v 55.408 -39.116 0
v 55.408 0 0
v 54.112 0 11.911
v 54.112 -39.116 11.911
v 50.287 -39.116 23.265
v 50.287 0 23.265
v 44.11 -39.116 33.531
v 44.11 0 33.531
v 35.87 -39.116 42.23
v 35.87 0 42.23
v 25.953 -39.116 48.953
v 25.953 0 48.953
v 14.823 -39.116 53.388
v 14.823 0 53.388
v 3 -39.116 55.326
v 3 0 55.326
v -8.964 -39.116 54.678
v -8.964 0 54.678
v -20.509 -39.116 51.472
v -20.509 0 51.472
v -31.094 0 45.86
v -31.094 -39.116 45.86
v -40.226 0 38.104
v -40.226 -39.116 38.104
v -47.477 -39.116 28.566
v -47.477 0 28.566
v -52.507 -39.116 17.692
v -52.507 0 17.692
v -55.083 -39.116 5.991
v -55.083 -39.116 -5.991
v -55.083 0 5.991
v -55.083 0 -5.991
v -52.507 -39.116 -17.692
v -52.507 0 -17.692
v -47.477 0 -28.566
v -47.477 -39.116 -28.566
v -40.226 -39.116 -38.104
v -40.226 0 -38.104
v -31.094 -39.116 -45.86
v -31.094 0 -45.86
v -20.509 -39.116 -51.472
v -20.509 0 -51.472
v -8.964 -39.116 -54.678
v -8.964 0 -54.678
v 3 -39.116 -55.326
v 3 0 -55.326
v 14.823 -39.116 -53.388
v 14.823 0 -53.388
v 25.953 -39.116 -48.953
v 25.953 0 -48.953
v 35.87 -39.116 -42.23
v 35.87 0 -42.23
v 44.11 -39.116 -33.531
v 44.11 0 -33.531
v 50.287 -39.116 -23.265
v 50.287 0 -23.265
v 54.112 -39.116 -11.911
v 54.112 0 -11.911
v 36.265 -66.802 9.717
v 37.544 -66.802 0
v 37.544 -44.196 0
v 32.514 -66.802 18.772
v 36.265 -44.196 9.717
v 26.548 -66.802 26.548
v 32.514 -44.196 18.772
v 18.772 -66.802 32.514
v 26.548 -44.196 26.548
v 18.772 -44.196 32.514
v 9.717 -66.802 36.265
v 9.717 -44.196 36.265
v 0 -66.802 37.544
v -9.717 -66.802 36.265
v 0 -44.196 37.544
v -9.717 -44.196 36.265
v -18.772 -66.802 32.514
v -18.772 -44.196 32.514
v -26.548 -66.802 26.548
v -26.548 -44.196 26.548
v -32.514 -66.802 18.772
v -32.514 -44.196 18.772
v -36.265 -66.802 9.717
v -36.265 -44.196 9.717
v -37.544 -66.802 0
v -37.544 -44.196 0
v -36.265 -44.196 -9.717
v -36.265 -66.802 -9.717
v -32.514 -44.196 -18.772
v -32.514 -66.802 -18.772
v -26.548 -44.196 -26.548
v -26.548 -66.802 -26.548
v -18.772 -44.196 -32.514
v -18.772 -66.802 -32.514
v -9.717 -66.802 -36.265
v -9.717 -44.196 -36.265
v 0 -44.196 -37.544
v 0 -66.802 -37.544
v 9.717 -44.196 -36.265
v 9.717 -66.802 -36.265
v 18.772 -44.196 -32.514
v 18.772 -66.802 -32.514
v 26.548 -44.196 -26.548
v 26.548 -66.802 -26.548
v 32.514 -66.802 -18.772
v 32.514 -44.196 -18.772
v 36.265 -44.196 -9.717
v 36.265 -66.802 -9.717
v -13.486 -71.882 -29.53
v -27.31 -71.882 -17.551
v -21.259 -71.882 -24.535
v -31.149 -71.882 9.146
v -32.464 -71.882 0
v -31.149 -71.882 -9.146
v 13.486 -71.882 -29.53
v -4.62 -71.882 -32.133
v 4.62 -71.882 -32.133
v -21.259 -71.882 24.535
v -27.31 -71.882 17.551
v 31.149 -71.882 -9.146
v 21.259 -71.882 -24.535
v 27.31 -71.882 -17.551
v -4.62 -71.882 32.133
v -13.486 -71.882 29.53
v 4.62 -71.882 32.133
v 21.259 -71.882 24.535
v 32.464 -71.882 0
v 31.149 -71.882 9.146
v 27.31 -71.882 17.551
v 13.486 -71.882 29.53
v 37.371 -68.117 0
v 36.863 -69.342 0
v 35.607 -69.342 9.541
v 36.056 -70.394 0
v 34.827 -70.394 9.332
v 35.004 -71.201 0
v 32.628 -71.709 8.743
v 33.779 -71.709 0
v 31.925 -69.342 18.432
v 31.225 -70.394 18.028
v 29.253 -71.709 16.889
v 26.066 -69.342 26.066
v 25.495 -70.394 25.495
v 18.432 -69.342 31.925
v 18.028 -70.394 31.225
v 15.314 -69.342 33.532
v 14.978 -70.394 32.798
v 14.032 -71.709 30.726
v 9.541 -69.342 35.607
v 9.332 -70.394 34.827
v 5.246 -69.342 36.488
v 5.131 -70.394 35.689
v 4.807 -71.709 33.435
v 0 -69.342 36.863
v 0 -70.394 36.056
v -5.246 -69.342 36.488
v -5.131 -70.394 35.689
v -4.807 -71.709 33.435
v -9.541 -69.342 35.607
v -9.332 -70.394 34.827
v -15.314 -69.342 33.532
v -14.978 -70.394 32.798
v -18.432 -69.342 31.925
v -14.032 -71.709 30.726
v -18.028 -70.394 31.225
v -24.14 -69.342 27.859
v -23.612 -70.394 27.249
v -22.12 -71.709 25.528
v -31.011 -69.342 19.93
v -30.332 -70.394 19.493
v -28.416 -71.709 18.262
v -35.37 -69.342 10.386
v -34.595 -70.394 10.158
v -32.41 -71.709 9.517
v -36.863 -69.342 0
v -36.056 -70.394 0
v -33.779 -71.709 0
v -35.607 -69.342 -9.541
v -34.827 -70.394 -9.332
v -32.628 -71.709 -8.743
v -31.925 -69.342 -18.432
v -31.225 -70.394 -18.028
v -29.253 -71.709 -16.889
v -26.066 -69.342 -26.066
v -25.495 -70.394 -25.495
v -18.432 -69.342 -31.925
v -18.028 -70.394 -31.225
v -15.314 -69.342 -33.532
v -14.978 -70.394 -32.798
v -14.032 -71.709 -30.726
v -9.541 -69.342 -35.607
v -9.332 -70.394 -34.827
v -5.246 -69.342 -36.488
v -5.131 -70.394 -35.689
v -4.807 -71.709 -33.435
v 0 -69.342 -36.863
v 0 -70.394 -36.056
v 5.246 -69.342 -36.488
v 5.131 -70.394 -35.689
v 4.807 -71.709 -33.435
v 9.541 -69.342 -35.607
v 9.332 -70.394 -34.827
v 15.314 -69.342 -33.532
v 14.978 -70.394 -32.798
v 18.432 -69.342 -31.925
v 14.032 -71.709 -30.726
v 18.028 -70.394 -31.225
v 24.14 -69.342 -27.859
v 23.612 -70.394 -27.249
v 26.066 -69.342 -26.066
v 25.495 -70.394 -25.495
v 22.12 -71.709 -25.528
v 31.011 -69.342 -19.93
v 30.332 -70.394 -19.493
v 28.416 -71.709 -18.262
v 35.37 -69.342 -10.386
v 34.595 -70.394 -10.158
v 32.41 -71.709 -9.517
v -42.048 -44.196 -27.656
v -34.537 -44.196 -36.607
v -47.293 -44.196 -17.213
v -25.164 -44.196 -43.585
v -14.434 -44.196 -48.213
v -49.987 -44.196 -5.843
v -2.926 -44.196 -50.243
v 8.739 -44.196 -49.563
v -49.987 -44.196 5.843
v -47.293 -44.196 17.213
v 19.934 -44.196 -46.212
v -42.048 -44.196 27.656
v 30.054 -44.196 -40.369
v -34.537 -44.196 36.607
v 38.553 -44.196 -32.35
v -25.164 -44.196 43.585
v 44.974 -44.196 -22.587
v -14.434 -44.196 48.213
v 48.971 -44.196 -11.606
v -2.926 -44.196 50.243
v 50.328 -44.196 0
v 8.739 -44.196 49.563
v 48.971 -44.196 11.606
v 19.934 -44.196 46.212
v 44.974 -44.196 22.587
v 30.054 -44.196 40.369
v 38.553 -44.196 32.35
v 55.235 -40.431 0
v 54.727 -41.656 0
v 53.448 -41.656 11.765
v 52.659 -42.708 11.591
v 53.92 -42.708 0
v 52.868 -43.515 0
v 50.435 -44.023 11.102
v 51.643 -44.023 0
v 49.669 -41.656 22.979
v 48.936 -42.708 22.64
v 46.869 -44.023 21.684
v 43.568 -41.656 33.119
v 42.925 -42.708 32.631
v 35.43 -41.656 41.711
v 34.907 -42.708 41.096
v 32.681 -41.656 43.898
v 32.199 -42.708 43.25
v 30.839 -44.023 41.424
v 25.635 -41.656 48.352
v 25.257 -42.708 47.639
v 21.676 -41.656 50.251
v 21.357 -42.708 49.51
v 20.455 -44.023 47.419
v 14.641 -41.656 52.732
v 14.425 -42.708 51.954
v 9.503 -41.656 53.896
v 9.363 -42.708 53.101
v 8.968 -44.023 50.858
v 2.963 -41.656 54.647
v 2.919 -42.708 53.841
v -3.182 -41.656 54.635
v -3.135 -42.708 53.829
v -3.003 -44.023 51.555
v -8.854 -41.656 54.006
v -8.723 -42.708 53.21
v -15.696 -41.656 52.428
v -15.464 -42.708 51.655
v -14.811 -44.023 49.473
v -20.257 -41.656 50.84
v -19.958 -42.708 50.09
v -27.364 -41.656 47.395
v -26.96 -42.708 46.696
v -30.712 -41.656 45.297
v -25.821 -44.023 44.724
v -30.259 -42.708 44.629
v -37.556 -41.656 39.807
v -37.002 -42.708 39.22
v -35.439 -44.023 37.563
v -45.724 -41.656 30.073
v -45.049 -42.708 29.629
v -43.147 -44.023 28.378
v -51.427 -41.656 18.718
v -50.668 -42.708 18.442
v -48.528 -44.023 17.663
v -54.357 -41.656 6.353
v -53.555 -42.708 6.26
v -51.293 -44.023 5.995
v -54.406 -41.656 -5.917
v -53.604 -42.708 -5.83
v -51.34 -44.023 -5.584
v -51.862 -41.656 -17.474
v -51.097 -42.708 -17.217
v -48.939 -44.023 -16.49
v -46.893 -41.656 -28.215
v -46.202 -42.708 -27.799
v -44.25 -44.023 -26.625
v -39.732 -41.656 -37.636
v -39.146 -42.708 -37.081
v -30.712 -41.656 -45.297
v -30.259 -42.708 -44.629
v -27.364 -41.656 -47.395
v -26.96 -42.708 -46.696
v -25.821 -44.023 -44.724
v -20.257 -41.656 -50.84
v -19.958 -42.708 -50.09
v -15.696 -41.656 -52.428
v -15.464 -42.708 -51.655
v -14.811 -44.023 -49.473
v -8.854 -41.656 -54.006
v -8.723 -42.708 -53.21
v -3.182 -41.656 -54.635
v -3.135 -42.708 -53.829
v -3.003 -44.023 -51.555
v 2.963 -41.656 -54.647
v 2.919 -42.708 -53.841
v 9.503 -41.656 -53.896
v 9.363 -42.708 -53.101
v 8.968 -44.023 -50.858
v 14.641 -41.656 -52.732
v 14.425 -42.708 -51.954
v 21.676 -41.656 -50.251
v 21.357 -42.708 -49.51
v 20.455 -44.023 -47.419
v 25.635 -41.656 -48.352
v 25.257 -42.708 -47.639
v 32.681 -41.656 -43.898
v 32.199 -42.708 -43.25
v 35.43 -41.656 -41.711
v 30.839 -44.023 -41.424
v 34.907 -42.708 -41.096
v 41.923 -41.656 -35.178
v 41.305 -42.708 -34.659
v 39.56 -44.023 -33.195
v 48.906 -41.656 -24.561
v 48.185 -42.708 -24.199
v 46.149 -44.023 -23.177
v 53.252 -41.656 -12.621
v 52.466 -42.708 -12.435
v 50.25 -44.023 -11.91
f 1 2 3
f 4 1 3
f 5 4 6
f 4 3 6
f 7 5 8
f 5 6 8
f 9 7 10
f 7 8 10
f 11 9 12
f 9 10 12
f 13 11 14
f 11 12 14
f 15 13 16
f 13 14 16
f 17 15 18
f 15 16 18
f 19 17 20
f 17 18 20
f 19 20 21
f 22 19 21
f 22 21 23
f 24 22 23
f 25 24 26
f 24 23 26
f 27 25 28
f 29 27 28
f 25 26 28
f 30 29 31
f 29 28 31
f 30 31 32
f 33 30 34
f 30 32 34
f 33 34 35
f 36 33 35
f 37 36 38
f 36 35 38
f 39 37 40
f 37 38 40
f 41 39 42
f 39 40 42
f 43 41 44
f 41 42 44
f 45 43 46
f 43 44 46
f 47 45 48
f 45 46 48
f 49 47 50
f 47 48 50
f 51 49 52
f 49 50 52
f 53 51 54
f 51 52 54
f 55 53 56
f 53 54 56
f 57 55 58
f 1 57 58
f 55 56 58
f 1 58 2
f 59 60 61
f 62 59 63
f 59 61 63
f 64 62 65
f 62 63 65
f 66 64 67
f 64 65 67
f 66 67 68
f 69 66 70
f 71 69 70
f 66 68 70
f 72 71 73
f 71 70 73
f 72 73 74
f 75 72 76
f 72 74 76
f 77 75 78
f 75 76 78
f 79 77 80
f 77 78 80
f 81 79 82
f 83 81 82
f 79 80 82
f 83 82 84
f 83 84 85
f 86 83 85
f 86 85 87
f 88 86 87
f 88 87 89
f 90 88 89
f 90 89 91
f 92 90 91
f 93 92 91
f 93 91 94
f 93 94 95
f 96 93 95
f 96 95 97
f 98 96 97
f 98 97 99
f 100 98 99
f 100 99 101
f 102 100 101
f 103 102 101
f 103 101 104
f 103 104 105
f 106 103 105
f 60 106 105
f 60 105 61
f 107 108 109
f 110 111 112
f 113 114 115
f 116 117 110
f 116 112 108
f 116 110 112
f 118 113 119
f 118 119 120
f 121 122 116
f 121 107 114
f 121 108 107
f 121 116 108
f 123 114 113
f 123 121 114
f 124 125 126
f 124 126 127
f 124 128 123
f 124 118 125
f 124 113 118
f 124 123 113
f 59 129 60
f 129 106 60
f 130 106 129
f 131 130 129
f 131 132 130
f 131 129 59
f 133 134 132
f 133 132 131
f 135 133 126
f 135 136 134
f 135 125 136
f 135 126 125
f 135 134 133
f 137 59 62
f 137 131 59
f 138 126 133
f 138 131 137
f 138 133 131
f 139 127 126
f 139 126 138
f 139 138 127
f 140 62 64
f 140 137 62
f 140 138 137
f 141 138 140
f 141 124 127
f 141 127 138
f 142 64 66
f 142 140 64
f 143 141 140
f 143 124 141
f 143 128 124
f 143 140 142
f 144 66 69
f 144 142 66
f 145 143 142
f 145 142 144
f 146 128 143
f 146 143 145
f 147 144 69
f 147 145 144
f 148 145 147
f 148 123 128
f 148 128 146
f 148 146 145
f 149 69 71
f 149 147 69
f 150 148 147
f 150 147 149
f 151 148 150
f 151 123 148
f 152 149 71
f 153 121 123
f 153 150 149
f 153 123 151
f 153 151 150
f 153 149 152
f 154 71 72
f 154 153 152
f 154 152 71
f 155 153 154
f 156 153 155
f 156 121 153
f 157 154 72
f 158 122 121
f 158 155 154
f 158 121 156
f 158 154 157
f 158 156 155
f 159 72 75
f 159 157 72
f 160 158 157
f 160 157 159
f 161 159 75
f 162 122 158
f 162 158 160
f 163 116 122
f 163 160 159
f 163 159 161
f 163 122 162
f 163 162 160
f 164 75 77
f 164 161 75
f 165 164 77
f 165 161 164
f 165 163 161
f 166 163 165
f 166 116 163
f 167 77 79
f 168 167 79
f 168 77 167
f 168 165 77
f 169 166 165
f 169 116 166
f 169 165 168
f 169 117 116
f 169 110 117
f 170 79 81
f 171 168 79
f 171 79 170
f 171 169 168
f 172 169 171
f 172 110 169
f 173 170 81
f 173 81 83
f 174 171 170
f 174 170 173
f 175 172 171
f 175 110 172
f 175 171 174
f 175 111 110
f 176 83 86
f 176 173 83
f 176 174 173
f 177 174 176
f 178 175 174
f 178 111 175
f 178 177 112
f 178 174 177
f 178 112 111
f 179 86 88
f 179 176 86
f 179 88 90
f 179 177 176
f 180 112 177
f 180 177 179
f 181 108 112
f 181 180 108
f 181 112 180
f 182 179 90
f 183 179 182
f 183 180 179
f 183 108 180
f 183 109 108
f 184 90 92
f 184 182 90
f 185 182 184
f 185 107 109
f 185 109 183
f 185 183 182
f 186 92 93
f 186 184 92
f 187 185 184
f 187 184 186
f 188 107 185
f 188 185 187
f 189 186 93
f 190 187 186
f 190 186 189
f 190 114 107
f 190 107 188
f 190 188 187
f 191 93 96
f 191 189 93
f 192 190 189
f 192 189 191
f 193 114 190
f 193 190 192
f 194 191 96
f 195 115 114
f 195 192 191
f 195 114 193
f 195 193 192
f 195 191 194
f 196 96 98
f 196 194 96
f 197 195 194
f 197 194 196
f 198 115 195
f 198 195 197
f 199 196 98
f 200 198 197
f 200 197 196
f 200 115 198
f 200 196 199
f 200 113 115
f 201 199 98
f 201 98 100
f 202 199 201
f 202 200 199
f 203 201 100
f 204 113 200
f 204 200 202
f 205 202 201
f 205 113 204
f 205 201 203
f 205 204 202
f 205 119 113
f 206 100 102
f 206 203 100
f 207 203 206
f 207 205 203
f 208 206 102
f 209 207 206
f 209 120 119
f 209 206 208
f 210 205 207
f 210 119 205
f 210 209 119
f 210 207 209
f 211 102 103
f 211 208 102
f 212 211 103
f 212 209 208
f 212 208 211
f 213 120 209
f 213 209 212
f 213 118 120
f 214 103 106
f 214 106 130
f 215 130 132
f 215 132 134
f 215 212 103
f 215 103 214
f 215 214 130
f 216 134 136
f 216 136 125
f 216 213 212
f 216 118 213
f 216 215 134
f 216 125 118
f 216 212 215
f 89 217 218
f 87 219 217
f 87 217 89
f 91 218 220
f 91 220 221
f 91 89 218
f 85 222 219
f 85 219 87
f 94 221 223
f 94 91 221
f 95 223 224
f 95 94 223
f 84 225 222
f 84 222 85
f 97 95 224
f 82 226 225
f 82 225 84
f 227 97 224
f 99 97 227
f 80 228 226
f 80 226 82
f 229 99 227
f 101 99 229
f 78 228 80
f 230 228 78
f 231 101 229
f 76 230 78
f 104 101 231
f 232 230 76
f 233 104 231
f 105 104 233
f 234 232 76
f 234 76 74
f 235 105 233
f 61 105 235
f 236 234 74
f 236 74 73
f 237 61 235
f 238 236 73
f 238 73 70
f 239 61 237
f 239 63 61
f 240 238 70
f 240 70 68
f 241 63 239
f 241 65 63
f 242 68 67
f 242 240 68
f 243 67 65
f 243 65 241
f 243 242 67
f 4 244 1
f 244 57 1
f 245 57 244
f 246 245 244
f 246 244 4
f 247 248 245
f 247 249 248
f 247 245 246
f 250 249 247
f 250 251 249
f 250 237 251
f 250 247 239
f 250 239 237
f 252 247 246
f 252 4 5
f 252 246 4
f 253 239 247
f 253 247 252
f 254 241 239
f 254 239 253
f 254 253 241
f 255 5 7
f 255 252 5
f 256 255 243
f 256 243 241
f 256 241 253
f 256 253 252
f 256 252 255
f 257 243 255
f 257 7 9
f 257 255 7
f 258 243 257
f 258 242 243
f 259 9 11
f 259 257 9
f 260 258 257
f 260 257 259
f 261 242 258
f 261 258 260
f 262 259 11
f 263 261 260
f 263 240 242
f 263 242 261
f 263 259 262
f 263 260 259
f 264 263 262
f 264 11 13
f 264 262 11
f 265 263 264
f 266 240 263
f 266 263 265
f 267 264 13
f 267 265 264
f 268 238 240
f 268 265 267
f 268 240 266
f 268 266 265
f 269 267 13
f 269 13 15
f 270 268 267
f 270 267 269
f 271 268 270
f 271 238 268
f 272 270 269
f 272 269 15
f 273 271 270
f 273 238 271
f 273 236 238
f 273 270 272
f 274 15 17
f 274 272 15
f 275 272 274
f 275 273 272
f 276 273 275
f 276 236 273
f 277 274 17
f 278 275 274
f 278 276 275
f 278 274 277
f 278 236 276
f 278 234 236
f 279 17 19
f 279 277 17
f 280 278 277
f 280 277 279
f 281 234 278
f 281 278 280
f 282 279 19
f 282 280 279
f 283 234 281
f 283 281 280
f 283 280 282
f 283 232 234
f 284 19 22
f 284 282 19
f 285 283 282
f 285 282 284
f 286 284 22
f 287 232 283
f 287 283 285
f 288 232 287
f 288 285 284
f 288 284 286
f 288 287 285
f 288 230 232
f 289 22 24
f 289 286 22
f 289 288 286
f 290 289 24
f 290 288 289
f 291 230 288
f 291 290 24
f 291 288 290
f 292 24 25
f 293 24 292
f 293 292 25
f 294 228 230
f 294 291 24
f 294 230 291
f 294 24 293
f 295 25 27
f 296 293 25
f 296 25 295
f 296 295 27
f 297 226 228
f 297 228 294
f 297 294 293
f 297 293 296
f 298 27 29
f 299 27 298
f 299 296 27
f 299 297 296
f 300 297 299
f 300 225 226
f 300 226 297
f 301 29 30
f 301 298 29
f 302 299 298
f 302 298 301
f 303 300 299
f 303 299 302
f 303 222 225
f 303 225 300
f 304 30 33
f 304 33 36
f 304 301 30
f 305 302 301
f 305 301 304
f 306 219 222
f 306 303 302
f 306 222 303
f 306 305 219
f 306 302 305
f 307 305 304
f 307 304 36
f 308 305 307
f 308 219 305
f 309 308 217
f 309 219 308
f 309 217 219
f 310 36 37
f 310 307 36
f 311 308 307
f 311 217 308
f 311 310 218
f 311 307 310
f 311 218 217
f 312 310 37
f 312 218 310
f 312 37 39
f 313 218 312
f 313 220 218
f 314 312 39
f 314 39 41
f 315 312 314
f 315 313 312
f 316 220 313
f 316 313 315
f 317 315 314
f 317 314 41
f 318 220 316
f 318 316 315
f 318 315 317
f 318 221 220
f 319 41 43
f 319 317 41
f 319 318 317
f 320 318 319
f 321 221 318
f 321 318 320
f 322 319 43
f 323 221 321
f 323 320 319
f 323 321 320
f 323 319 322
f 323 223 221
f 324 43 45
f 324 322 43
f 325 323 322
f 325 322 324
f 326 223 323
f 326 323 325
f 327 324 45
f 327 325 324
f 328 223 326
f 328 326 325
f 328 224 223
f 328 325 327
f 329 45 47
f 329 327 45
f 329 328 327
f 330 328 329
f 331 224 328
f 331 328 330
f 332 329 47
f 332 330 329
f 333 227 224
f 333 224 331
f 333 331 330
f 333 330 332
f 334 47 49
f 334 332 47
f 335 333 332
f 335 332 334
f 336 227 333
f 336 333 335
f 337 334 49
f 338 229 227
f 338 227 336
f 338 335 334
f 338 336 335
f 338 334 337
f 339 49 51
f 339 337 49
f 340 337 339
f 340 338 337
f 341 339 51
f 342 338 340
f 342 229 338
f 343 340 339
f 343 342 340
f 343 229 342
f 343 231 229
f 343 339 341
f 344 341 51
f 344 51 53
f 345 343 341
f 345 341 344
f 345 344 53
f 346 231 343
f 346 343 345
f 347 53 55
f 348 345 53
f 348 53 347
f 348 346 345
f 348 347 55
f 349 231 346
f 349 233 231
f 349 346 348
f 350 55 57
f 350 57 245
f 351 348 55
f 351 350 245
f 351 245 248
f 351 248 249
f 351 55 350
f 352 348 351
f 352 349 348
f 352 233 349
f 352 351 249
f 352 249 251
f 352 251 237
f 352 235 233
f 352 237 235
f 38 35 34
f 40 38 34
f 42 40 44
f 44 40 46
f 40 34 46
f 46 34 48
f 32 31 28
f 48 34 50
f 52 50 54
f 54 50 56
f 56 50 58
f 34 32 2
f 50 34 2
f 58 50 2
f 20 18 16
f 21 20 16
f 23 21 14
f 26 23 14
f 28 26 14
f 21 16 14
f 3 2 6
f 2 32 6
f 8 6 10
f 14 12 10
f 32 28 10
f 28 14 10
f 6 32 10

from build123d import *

# Parameters (mm, degrees)
F0_R     = 55.407722
F1_DEPTH = 44.196
F2_R     = 37.543848
F3_DEPTH = 71.882
F4_R     = 5.08


with BuildPart() as f1:
    # F0 (on Front) → F1 (new body)
    with BuildSketch(Plane.XZ):
        Circle(F0_R)
    extrude(amount=F1_DEPTH)

    # F2 (on Front) → F3 (join)
    with BuildSketch(Plane.XZ):
        Circle(F2_R)
    extrude(amount=F3_DEPTH)

    # F4
    f4_edges = [f1.edges().sort_by_distance(p)[0] for p in [
        (-37.543848, -71.882, 0),
        (-55.407722, -44.196, 0),
    ]]
    fillet(f4_edges, radius=F4_R)


solid = f1.part
